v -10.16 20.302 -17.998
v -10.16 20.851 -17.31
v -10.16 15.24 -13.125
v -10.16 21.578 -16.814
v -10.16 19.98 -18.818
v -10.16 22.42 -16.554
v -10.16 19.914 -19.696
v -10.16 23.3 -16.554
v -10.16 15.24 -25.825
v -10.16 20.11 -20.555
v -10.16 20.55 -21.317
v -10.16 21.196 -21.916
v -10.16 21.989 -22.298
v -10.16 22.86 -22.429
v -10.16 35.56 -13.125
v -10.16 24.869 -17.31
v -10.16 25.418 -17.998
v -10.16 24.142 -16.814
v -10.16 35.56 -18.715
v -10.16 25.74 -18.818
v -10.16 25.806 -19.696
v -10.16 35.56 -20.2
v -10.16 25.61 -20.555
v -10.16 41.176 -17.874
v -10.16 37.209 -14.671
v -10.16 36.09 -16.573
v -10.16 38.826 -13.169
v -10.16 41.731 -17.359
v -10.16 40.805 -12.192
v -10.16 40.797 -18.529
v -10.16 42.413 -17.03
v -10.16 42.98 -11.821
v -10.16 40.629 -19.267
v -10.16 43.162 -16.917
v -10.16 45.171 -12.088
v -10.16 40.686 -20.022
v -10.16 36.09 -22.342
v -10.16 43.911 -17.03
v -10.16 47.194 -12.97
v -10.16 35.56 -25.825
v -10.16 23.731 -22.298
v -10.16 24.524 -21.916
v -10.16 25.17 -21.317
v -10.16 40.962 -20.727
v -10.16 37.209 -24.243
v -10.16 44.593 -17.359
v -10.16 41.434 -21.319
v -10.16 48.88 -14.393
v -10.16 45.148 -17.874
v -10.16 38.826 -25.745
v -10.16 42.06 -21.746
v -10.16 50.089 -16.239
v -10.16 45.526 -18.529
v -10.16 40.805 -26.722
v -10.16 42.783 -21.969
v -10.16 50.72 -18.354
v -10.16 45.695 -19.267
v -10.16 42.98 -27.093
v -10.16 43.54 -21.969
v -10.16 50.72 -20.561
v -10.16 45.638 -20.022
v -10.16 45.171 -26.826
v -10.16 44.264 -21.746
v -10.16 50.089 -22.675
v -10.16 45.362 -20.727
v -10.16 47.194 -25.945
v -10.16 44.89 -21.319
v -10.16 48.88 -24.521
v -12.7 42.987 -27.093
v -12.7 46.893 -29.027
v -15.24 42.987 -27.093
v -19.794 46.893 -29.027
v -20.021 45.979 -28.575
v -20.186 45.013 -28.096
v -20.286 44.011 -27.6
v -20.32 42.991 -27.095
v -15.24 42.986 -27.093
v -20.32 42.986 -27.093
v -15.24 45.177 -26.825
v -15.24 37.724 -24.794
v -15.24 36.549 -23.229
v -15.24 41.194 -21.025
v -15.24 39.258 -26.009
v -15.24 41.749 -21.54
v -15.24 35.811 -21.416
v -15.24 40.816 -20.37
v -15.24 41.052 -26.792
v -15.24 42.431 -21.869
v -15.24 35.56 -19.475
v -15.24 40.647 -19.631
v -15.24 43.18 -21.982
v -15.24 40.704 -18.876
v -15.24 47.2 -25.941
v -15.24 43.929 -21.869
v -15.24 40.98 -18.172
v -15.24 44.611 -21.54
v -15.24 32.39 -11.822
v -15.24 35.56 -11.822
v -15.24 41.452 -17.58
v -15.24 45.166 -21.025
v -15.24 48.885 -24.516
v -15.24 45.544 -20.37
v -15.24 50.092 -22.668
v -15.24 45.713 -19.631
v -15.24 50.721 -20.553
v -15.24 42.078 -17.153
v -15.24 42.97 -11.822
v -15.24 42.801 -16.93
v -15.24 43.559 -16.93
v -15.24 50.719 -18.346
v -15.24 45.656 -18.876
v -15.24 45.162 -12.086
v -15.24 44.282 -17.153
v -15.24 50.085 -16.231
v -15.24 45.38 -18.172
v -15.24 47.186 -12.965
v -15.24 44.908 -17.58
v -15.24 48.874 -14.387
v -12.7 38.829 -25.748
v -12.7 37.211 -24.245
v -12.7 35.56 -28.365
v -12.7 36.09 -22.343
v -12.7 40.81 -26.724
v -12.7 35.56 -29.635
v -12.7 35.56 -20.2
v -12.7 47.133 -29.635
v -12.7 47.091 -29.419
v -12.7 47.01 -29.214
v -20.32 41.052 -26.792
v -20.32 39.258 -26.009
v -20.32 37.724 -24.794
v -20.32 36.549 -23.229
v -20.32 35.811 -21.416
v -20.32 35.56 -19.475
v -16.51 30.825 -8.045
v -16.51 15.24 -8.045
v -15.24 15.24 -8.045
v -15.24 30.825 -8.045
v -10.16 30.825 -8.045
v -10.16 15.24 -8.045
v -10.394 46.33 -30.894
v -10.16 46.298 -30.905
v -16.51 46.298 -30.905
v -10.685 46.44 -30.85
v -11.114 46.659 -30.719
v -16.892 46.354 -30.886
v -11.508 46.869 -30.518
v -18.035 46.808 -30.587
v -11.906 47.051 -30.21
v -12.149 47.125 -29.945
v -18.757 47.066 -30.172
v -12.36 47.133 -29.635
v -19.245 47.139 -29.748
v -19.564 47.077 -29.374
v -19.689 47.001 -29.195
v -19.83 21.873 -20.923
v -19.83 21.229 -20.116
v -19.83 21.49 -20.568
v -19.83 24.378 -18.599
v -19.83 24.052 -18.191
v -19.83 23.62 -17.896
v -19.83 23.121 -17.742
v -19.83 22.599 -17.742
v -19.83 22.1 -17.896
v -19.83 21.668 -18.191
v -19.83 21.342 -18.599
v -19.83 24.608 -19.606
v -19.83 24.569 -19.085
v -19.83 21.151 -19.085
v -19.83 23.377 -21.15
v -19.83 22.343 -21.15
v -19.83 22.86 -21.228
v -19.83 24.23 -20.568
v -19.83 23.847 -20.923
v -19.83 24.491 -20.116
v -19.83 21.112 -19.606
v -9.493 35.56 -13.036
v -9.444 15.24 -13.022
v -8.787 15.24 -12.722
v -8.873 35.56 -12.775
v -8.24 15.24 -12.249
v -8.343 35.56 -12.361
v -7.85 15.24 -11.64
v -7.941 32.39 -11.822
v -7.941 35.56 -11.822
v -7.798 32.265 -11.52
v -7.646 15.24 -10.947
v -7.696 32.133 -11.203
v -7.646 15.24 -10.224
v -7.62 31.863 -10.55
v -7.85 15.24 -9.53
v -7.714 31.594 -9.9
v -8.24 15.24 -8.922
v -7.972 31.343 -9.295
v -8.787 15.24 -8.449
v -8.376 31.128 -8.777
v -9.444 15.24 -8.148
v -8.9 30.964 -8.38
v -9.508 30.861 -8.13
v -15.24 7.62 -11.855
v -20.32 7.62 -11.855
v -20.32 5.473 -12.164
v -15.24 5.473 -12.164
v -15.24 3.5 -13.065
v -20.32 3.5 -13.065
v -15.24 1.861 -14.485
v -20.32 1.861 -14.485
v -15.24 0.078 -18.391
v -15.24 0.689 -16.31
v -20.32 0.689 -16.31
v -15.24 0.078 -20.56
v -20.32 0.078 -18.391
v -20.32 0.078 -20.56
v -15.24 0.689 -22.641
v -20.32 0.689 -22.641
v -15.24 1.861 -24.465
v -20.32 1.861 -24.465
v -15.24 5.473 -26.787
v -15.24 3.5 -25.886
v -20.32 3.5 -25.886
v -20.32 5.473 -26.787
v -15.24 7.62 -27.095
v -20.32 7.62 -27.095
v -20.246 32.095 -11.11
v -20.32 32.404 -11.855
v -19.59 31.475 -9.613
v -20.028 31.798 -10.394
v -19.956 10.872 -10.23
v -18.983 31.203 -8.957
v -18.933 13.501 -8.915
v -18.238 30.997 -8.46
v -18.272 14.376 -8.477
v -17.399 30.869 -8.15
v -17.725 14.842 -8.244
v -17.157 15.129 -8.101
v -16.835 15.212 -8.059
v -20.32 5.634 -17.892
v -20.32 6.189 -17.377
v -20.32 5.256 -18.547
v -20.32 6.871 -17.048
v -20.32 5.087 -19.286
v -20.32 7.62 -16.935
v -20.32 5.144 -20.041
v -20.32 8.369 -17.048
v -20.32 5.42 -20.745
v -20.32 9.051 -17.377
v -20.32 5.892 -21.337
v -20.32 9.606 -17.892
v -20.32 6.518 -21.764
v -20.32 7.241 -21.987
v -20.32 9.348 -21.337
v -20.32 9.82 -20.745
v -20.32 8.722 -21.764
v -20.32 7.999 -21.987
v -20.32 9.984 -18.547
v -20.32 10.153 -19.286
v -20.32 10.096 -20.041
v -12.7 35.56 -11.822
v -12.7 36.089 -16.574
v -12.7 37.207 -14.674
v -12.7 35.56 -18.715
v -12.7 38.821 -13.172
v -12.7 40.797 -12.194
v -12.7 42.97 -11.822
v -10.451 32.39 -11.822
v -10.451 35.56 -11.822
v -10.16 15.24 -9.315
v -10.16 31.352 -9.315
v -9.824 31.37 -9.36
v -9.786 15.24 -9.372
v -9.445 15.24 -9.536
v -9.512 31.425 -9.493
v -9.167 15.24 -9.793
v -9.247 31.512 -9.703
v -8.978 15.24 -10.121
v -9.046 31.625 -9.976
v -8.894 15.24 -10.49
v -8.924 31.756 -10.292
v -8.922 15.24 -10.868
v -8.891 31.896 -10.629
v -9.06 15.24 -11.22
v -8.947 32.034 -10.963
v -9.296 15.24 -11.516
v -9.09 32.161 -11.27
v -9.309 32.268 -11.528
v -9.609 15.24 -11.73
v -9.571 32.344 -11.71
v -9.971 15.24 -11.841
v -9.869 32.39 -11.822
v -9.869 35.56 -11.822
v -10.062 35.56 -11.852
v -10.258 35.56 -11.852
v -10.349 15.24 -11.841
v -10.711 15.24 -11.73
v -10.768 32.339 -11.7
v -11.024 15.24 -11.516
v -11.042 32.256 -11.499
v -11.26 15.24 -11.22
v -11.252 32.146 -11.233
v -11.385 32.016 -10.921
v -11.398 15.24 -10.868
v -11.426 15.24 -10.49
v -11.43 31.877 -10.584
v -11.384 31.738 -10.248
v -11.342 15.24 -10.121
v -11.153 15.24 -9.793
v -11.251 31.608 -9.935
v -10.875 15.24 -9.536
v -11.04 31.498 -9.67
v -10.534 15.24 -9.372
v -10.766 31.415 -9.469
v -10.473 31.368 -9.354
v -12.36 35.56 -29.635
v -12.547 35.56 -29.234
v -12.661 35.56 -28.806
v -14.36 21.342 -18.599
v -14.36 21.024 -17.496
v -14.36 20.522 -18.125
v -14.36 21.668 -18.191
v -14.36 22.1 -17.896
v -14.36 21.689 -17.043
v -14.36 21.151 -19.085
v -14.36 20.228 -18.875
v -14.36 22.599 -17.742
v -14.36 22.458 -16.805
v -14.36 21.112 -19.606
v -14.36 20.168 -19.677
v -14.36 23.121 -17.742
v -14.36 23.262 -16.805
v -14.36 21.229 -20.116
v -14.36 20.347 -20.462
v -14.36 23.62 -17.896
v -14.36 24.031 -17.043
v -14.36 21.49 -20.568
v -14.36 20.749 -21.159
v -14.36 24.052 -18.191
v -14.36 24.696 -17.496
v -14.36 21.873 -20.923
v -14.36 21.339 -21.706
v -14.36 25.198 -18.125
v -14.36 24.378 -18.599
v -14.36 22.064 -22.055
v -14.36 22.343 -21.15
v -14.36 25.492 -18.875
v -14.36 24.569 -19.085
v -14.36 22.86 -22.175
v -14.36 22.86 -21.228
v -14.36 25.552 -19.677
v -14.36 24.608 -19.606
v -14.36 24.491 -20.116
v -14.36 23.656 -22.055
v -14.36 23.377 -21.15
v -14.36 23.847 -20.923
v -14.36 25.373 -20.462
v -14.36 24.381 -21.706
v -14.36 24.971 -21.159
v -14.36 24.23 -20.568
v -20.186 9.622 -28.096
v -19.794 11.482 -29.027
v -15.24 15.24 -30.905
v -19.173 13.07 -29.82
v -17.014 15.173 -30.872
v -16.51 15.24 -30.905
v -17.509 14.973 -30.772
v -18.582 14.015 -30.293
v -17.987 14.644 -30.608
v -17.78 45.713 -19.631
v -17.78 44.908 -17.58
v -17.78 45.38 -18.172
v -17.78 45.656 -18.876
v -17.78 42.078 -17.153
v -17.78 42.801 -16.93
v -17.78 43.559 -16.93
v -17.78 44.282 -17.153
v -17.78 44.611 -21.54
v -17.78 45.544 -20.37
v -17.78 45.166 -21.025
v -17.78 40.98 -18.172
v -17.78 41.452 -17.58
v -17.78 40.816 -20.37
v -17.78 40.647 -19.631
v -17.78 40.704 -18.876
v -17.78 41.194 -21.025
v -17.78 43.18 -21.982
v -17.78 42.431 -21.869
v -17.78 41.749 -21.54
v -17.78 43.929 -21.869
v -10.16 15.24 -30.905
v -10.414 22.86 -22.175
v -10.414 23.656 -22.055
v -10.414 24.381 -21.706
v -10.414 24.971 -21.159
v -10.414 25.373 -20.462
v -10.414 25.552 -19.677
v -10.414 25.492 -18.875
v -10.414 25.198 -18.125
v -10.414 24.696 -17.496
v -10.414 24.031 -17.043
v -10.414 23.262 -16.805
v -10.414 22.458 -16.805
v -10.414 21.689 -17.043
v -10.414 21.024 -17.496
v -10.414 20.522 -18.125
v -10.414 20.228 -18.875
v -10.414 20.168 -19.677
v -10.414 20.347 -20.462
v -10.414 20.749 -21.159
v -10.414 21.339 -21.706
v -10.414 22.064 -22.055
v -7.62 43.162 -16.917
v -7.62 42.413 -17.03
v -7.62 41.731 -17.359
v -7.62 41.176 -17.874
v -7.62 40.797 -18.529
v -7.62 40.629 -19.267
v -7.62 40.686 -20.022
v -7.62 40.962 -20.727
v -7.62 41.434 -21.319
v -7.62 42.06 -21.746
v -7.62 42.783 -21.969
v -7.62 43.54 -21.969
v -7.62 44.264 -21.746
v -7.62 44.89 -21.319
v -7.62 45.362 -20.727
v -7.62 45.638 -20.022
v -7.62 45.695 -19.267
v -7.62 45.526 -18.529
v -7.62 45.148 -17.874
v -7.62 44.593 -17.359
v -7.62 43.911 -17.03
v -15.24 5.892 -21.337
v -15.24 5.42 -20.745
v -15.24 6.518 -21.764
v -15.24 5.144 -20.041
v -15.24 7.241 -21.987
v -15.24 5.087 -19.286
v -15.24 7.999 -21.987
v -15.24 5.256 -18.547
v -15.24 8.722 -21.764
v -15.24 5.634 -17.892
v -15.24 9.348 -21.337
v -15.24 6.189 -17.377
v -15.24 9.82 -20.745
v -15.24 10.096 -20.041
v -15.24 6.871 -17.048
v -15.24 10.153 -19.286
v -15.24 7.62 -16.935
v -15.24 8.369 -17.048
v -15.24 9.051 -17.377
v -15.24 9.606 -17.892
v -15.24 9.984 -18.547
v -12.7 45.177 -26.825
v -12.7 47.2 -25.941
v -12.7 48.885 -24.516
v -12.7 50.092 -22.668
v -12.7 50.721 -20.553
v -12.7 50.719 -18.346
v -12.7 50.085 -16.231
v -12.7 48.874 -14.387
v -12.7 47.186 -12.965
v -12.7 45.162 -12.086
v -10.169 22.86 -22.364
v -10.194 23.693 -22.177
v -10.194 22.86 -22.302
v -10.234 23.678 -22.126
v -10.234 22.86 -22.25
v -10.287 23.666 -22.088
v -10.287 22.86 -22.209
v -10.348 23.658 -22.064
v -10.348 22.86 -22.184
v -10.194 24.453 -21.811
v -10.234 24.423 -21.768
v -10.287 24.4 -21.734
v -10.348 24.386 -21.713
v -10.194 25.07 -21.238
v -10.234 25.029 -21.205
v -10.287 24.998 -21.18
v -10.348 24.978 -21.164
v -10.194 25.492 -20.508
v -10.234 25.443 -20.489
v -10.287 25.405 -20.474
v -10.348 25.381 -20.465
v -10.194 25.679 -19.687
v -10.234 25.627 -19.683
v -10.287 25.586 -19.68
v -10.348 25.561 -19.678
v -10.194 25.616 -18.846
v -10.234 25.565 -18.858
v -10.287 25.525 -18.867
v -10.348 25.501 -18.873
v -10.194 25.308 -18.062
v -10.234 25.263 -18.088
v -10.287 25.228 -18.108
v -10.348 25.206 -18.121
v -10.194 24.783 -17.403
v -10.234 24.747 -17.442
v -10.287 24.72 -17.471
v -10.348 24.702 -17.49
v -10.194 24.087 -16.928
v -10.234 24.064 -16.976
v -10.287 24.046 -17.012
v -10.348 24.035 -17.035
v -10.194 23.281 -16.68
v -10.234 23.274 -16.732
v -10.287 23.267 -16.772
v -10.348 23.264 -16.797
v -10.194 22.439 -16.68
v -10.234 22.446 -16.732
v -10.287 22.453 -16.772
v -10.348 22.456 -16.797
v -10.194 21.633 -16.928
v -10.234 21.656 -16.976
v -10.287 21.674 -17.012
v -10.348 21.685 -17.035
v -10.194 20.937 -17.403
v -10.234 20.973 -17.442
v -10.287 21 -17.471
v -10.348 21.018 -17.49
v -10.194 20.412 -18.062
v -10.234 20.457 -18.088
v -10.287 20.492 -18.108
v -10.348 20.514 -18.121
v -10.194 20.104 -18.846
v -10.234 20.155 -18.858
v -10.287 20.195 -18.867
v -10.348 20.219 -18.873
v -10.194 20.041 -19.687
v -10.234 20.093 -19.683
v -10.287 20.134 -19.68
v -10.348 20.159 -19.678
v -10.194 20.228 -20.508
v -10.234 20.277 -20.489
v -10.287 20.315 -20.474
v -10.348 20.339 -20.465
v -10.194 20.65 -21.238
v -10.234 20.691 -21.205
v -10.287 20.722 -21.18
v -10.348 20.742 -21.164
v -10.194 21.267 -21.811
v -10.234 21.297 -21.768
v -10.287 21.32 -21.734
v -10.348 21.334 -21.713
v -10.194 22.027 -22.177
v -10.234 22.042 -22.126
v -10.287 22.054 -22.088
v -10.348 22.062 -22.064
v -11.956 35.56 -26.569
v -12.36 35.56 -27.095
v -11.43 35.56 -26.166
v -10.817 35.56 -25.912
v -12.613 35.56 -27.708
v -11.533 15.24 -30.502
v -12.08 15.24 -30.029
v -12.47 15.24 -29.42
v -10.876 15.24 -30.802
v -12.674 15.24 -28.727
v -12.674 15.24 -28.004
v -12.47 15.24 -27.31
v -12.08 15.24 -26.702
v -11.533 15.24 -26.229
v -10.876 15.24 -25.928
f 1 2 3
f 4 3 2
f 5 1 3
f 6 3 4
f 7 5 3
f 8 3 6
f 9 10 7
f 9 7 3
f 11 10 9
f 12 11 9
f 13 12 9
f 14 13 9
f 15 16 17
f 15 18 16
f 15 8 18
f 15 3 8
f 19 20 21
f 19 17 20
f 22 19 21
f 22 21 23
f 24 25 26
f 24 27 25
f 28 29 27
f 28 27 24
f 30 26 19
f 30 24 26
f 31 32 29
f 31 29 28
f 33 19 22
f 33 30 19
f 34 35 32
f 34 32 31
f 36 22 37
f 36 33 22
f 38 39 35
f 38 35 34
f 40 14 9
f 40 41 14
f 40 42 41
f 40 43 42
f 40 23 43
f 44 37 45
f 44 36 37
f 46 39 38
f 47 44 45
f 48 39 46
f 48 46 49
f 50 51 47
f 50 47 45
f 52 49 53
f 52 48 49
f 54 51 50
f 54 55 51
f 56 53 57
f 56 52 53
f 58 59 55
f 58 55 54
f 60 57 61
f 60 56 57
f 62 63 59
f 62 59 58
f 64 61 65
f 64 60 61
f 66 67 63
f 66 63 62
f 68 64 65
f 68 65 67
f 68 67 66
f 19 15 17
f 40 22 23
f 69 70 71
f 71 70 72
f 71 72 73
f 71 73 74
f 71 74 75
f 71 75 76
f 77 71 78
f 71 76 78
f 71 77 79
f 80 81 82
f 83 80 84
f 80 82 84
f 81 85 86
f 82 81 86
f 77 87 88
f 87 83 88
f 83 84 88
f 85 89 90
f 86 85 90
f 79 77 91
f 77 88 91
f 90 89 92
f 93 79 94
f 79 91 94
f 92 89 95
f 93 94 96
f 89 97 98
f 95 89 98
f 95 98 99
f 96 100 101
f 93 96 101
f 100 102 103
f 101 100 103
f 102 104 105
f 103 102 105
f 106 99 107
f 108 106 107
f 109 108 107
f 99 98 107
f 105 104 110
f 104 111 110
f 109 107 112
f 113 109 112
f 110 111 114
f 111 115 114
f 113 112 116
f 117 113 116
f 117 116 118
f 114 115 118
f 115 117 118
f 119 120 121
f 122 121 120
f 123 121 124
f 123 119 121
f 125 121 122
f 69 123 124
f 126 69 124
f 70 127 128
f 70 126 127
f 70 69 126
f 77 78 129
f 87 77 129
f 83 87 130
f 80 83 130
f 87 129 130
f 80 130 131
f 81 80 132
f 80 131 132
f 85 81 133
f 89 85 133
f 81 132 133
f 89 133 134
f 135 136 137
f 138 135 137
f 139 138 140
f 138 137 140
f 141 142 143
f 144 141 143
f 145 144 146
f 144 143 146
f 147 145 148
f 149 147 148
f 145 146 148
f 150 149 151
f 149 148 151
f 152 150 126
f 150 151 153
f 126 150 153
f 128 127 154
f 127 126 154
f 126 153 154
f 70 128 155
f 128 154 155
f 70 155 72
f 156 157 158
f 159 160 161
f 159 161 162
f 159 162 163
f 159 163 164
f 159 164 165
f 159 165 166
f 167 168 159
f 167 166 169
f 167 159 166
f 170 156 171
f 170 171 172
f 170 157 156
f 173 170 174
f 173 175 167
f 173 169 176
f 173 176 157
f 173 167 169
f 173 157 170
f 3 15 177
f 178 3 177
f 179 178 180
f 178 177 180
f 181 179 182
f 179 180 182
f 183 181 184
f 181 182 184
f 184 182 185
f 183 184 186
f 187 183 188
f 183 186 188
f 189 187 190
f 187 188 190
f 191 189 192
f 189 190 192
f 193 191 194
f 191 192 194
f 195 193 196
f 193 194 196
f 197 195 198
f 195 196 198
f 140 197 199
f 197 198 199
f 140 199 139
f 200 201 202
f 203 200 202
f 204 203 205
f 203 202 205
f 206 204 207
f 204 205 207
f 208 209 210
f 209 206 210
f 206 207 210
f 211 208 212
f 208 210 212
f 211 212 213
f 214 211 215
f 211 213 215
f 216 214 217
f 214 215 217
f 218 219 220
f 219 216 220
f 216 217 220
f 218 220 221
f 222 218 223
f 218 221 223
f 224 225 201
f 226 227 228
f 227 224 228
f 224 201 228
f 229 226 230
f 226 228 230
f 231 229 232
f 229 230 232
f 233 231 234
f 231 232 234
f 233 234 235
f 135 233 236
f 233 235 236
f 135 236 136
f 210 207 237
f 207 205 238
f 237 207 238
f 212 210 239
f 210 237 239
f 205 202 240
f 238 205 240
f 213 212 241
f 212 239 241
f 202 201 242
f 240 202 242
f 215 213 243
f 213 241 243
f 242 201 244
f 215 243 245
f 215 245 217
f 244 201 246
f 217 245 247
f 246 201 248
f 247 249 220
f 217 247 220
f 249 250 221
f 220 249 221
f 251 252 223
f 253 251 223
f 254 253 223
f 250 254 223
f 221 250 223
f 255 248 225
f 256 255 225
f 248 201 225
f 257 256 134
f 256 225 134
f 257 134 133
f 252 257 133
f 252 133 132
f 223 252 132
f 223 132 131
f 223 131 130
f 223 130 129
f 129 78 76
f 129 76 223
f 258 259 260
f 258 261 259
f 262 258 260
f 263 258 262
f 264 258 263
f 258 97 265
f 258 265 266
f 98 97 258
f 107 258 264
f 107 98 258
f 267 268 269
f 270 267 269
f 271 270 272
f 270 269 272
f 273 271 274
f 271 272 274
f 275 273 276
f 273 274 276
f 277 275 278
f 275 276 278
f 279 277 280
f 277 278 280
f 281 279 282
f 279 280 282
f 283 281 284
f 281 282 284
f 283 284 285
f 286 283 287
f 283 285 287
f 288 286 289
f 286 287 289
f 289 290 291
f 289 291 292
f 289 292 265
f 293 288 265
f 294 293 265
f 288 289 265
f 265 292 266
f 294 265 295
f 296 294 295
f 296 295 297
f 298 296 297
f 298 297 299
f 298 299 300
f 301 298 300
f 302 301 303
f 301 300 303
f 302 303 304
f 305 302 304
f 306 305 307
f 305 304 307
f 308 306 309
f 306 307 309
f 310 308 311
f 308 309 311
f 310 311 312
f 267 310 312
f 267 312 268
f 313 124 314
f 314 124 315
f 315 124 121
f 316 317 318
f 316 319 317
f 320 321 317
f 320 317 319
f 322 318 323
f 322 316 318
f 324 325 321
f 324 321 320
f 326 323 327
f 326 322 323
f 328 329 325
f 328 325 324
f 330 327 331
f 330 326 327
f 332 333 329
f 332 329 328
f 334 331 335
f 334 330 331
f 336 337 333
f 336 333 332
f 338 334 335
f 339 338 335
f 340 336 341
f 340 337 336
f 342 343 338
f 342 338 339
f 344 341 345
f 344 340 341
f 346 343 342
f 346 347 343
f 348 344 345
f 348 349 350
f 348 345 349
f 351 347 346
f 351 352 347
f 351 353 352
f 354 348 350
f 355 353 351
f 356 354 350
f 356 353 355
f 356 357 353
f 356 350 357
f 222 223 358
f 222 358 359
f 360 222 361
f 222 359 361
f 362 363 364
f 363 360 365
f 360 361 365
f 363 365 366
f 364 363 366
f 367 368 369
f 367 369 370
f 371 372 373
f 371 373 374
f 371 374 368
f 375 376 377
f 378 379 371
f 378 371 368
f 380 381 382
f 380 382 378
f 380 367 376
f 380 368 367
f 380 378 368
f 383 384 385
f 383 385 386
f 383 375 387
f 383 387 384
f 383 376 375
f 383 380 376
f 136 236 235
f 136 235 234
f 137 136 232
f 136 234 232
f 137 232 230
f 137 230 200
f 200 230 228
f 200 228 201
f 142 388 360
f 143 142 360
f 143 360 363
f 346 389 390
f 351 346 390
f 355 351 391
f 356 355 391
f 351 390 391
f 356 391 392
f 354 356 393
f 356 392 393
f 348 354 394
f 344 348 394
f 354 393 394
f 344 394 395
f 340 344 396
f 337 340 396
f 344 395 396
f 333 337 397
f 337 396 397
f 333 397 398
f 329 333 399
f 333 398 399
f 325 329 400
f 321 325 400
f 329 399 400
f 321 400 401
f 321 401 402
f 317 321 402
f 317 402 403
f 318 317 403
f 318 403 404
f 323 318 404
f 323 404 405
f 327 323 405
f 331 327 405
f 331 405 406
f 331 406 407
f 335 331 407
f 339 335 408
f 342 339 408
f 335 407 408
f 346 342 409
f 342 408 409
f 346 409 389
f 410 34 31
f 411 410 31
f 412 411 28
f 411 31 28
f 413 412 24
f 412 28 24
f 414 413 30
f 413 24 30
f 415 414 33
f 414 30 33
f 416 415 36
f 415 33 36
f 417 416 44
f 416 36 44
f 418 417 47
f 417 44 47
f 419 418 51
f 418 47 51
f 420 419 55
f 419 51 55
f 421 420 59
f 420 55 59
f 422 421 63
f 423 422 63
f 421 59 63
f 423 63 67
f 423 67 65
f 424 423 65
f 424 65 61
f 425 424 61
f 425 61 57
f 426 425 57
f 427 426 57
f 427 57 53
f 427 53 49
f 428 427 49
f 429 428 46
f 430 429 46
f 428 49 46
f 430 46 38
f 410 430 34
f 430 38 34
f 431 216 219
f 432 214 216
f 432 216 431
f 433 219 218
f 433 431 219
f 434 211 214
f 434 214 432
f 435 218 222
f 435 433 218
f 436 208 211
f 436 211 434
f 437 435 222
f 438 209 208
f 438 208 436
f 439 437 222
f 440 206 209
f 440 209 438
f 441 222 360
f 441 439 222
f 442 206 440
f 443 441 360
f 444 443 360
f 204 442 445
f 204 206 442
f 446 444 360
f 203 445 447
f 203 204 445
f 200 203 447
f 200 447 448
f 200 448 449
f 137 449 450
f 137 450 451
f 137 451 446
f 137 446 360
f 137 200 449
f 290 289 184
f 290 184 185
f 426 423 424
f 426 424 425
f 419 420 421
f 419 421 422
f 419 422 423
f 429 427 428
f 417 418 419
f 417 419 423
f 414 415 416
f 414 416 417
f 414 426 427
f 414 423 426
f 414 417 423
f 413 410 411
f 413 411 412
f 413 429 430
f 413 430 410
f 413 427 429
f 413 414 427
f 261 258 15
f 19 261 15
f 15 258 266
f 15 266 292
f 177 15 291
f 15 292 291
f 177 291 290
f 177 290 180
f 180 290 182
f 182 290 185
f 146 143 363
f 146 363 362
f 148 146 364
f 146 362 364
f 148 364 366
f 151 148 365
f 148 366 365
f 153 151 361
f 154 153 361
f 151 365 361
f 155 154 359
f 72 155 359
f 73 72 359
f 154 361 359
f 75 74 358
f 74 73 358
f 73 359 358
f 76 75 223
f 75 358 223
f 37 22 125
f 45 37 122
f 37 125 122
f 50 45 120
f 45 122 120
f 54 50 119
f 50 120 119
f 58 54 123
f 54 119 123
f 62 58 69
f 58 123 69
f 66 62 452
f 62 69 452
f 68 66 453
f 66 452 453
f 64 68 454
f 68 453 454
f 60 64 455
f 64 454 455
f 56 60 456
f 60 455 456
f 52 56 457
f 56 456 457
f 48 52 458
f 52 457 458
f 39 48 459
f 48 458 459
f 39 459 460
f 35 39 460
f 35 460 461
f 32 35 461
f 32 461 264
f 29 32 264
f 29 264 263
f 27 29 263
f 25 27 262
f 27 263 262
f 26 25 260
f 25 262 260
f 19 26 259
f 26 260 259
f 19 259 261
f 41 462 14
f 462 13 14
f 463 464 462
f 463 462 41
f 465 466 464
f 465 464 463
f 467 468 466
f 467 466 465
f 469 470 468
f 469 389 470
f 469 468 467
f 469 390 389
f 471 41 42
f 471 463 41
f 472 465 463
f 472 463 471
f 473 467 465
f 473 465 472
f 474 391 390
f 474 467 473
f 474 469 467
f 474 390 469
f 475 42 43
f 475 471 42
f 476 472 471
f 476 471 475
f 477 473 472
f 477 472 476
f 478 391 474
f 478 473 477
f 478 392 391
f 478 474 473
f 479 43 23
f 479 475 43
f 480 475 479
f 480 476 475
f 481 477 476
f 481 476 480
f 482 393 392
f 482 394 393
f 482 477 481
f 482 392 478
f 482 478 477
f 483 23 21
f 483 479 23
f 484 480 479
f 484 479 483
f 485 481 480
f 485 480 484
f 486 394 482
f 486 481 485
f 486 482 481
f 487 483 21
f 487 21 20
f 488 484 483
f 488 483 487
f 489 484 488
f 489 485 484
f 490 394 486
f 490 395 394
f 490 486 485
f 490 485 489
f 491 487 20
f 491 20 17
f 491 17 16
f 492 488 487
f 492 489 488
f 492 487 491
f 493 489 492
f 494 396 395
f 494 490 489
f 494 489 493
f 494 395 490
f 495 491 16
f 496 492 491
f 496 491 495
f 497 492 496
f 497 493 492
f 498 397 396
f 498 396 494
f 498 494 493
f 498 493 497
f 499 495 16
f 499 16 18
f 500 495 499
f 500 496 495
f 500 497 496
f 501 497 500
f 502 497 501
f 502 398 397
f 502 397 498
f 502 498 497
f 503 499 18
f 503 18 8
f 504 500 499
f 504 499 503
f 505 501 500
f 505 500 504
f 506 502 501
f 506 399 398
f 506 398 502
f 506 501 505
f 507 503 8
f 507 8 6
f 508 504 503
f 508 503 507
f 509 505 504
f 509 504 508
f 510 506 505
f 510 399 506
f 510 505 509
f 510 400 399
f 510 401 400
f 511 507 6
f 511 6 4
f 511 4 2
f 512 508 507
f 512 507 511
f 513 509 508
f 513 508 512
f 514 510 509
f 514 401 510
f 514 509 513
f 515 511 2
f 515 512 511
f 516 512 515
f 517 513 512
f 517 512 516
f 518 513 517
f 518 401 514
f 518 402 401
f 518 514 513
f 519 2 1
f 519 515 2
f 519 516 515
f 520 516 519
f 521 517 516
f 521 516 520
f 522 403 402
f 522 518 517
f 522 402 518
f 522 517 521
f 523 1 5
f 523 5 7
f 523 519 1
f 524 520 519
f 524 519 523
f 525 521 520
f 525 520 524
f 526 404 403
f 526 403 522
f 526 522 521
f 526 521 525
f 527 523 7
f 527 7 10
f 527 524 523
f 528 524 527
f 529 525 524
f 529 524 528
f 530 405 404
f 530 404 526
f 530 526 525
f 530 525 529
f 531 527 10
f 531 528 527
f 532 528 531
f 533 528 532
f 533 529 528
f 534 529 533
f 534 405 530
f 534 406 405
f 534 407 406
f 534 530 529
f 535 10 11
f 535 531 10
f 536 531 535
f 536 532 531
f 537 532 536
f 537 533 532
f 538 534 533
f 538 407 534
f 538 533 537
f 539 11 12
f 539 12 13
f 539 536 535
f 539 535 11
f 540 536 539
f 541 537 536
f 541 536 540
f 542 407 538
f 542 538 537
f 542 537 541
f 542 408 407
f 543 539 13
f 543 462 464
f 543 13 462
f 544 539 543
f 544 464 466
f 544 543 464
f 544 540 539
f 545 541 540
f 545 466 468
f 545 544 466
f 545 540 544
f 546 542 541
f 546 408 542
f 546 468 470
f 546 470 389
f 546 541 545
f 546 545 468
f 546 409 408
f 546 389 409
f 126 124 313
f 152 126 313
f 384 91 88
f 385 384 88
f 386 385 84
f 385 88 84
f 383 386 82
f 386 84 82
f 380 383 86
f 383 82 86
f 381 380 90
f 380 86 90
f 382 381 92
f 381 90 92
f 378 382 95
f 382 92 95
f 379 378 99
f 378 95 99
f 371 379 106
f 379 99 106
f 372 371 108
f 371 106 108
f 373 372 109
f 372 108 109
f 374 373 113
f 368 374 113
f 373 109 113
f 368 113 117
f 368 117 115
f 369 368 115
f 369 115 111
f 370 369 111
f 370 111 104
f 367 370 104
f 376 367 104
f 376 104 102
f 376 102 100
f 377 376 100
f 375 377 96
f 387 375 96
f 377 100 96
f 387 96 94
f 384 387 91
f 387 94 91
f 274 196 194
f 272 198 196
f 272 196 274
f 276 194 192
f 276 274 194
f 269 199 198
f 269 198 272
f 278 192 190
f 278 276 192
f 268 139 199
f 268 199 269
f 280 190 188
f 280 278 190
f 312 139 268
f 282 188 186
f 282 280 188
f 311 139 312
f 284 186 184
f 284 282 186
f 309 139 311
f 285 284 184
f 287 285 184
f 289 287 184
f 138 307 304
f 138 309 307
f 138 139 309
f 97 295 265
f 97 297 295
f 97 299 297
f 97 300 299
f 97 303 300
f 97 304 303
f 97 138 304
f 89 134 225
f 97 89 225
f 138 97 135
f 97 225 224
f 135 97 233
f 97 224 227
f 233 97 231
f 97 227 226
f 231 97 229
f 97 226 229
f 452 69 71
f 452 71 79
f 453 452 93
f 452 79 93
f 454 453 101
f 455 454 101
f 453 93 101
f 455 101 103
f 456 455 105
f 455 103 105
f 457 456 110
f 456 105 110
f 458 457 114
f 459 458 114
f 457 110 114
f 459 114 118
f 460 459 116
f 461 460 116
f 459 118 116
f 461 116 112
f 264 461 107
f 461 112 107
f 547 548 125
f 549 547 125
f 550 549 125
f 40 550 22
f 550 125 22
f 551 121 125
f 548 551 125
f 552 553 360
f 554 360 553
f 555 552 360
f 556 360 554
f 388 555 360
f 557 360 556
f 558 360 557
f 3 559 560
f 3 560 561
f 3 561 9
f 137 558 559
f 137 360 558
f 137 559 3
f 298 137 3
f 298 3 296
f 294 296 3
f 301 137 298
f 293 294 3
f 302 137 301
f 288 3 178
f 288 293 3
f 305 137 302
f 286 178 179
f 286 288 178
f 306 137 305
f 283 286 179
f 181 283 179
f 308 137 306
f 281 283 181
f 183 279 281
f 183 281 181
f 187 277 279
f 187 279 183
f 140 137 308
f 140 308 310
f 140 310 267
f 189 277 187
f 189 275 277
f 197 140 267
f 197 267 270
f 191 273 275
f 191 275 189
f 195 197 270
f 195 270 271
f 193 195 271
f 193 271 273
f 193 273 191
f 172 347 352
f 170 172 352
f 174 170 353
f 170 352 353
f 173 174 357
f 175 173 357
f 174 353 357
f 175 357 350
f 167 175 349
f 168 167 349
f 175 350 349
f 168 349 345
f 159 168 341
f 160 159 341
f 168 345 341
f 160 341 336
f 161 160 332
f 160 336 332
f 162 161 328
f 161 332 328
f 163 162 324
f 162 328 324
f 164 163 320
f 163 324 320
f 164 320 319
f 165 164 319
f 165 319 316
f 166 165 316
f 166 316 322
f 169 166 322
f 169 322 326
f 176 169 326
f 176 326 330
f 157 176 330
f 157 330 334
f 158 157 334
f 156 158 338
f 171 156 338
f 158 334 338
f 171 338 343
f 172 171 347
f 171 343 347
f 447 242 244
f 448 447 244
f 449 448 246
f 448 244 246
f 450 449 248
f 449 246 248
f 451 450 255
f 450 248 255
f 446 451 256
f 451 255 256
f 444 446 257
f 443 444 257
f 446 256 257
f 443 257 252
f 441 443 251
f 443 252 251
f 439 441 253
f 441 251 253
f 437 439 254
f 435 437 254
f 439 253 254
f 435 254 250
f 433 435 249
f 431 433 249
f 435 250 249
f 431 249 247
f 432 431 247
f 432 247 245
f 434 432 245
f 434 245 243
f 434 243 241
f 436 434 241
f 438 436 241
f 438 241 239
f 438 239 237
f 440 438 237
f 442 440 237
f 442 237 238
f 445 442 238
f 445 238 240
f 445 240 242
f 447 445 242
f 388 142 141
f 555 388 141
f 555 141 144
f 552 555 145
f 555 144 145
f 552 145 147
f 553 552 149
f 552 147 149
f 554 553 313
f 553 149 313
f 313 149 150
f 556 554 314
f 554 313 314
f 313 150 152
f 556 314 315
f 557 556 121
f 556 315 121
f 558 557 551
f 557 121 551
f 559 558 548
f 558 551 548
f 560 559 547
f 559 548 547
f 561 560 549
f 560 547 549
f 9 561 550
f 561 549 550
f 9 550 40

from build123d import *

# Parameters (mm, degrees)
BOSS_EXTRUDE1_DEPTH = 50.8
SKETCH3_R           = 1.27
CUT_EXTRUDE2_DEPTH  = 50.8
CUT_EXTRUDE1_DEPTH  = 50.8
CUT_EXTRUDE6_DEPTH  = 50.8
BOSS_EXTRUDE3_DEPTH = 20.32
SKETCH4_W           = 10.16
SKETCH4_H           = 15.24
CUT_EXTRUDE3_DEPTH  = 50.8
SKETCH5_R           = 2.54
CUT_EXTRUDE5_DEPTH  = 50.8
SKETCH8_R           = 2.54
BOSS_EXTRUDE2_DEPTH = 2.54
LPATTERN1_COUNT     = 2
LPATTERN1_PITCH     = 12.7
CUT_EXTRUDE7_DEPTH  = 20.32
SKETCH12_W          = 5.08
SKETCH12_H          = 19.941398178
CUT_EXTRUDE8_DEPTH  = 21.59
CUT_EXTRUDE9_DEPTH  = 5.08
LPATTERN2_COUNT     = 2
LPATTERN2_PITCH     = 15.24
CUT_EXTRUDE10_DEPTH = 40.767
SKETCH14_R          = 7.638081415
BOSS_EXTRUDE4_DEPTH = 2.54
SKETCH16_R          = 2.54
BOSS_EXTRUDE5_DEPTH = 2.54
SKETCH21_W          = 3.776239755
SKETCH21_H          = 7.410355269
CUT_EXTRUDE14_DEPTH = 2.54
CUT_EXTRUDE15_DEPTH = 9.906
SKETCH23_R          = 2.7
CUT_EXTRUDE16_DEPTH = 4.2
FILLET1_R           = 0.254
SKETCH24_R          = 1.7526
CUT_EXTRUDE17_DEPTH = 5.47


with BuildPart() as part:
    # Sketch1 → Boss-Extrude1 (new body)
    with BuildSketch(Plane(origin=(0, 0, 0), x_dir=(1, 0, 0), z_dir=(0, 1, 0))):
        with BuildLine():
            Line((-20.32, 27.095319289), (-20.32, 11.855319289))
            ThreePointArc((-20.32, 11.855319289), (-19.204076836, 9.161242453), (-16.51, 8.045319289))
            Line((-16.51, 8.045319289), (-3.81, 8.045319289))
            ThreePointArc((-3.81, 8.045319289), (-1.115923164, 9.161242453), (0, 11.855319289))
            Line((0, 11.855319289), (0, 27.095319289))
            ThreePointArc((0, 27.095319289), (-1.115923164, 29.789396126), (-3.81, 30.905319289))
            Line((-3.81, 30.905319289), (-16.51, 30.905319289))
            ThreePointArc((-16.51, 30.905319289), (-19.204076836, 29.789396126), (-20.32, 27.095319289))
        make_face()
    extrude(amount=BOSS_EXTRUDE1_DEPTH)

    # Sketch3 → Cut-Extrude2 (cut)
    with BuildSketch(Plane(origin=(0, 50.8, 0), x_dir=(1, 0, 0), z_dir=(0, 1, 0))):
        with Locations(Location((-10.16, 10.585319289, 0), (0, 0, 270))):
            Circle(SKETCH3_R)
        with Locations(Location((-10.16, 28.365319289, 0), (0, 0, 270))):
            Circle(SKETCH3_R)
    extrude(amount=-CUT_EXTRUDE2_DEPTH, mode=Mode.SUBTRACT)

    # Sketch2 → Cut-Extrude1 (cut)
    with BuildSketch(Plane.ZY.offset(20.32)):
        with BuildLine():
            Line((-27.095319289, 7.62), (-30.905319289, 15.24))
            Line((-30.905319289, 15.24), (-30.905319289, -5.08))
            Line((-30.905319289, -5.08), (-8.045319289, -5.08))
            Line((-8.045319289, -5.08), (-8.045319289, 15.24))
            Line((-8.045319289, 15.24), (-11.855319289, 7.62))
            ThreePointArc((-11.855319289, 7.62), (-19.475319289, 0), (-27.095319289, 7.62))
        make_face()
        with BuildLine():
            Line((-11.821559044, 42.970355269), (-8.045319289, 35.56))
            Line((-8.045319289, 35.56), (-8.045319289, 55.88))
            Line((-8.045319289, 55.88), (-30.905319289, 55.88))
            Line((-30.905319289, 55.88), (-30.905319289, 35.56))
            Line((-30.905319289, 35.56), (-27.092422036, 42.951560486))
            ThreePointArc((-27.092422036, 42.951560486), (-19.46663852, 50.799994215), (-11.821559044, 42.970355269))
        make_face()
    extrude(amount=-CUT_EXTRUDE1_DEPTH, mode=Mode.SUBTRACT)

    # Sketch7 → Cut-Extrude6 (cut)
    with BuildSketch(Plane.XY.offset(-8.045319289)):
        Polygon((-15.24, 50.8), (-12.7, 50.8), (-12.7, 35.56), (-7.62, 35.56), (-7.62, 50.8), (-5.08, 50.8), (-5.08, 35.56), (0, 35.56), (0, 59.156438057), (-20.32, 59.156438057), (-20.32, 35.56), (-15.24, 35.56), align=None)
    extrude(amount=-CUT_EXTRUDE6_DEPTH, mode=Mode.SUBTRACT)

    # Sketch9 → Boss-Extrude3 (add)
    with BuildSketch(Plane.ZY.offset(20.32)):
        with BuildLine():
            Line((-19.475319289, 35.56), (-30.961107471, 35.56))
            Line((-30.961107471, 35.56), (-30.961107471, 45.935432902))
            ThreePointArc((-30.961107471, 45.935432902), (-30.291229548, 47.014503778), (-29.026975399, 46.892882091))
            Line((-29.026975399, 46.892882091), (-27.092843326, 42.985764183))
            ThreePointArc((-27.092843326, 42.985764183), (-24.794356941, 37.723605727), (-19.475319289, 35.56))
        make_face()
    extrude(amount=-BOSS_EXTRUDE3_DEPTH)

    # Sketch4 → Cut-Extrude3 (cut)
    with BuildSketch(Plane.XY.offset(-8.045319289)):
        with Locations((-10.16, 7.62)):
            Rectangle(SKETCH4_W, SKETCH4_H)
    extrude(amount=-CUT_EXTRUDE3_DEPTH, mode=Mode.SUBTRACT)

    # Sketch5 → Cut-Extrude5 (cut)
    with BuildSketch(Plane.ZY.offset(20.32)):
        with Locations((-19.475319289, 7.62)):
            Circle(SKETCH5_R)
    extrude(amount=-CUT_EXTRUDE5_DEPTH, mode=Mode.SUBTRACT)

    # Sketch8 → Boss-Extrude2 (add)
    with BuildSketch(Plane.ZY.offset(15.24)):
        with Locations(Location((-19.441559044, 43.179995622, 0), (0, 0, 180))):
            Circle(SKETCH8_R)
    boss_extrude2 = extrude(amount=BOSS_EXTRUDE2_DEPTH)

    # LPattern1: Boss-Extrude2 ×2
    with Locations(*[(i * LPATTERN1_PITCH, 0, 0) for i in range(1, LPATTERN1_COUNT)]):
        add(boss_extrude2)

    # Sketch10 → Cut-Extrude7 (cut)
    with BuildSketch(Plane.XZ.offset(-35.56)):
        with BuildLine():
            Line((-16.51, -30.905319289), (-3.81, -30.905319289))
            ThreePointArc((-3.81, -30.905319289), (-1.115923164, -29.789396126), (0, -27.095319289))
            Line((0, -27.095319289), (5.770912039, -37.258829719))
            Line((5.770912039, -37.258829719), (-26.797758959, -37.890739908))
            Line((-26.797758959, -37.890739908), (-20.32, -27.095319289))
            ThreePointArc((-20.32, -27.095319289), (-19.204076836, -29.789396126), (-16.51, -30.905319289))
        make_face()
    extrude(amount=-CUT_EXTRUDE7_DEPTH, mode=Mode.SUBTRACT)

    # Sketch12 → Cut-Extrude8 (cut)
    with BuildSketch(Plane.XY.offset(-8.045319289)):
        with Locations((-10.16, 45.530699089)):
            Rectangle(SKETCH12_W, SKETCH12_H)
    extrude(amount=-CUT_EXTRUDE8_DEPTH, mode=Mode.SUBTRACT)

    # Sketch13 → Cut-Extrude9 (cut)
    with BuildSketch(Plane.ZY.offset(20.32)):
        Polygon((-19.475319289, 35.56), (-8.045319289, 30.82545932), (-1.320705488, 30.82545932), (-1.320705488, 35.56), align=None)
    cut_extrude9 = extrude(amount=-CUT_EXTRUDE9_DEPTH, mode=Mode.SUBTRACT)

    # LPattern2: Cut-Extrude9 ×2
    with Locations(*[(i * LPATTERN2_PITCH, 0, 0) for i in range(1, LPATTERN2_COUNT)]):
        add(cut_extrude9, mode=Mode.SUBTRACT)

    # Sketch15 → Cut-Extrude10 (cut, symmetric)
    with BuildSketch(Plane(origin=(0, 35.56, 0), x_dir=(1, 0, 0), z_dir=(0, 1, 0))):
        with BuildLine():
            Line((-10.16, 25.825319289), (-10.16, 13.125319289))
            ThreePointArc((-10.16, 13.125319289), (-7.62, 10.585319289), (-10.16, 8.045319289))
            Line((-10.16, 8.045319289), (12.124662948, -15.989120413))
            Line((12.124662948, -15.989120413), (8.97204404, 40.385502166))
            Line((8.97204404, 40.385502166), (-10.16, 30.905319289))
            ThreePointArc((-10.16, 30.905319289), (-12.7, 28.365319289), (-10.16, 25.825319289))
        make_face()
    extrude(amount=CUT_EXTRUDE10_DEPTH, both=True, mode=Mode.SUBTRACT)

    # Sketch14 → Boss-Extrude4 (add)
    with BuildSketch(Plane(origin=(-12.7, 0, 0), x_dir=(0, 0, -1), z_dir=(1, 0, 0))):
        with Locations((19.457237874, 43.161918585)):
            Circle(SKETCH14_R)
    extrude(amount=BOSS_EXTRUDE4_DEPTH)

    # Sketch16 → Boss-Extrude5 (add)
    with BuildSketch(Plane(origin=(-10.16, 0, 0), x_dir=(0, 0, -1), z_dir=(1, 0, 0))):
        with Locations(Location((19.457237874, 43.161918585, 0), (0, 0, 180))):
            Circle(SKETCH16_R)
    extrude(amount=BOSS_EXTRUDE5_DEPTH)

    # Sketch21 → Cut-Extrude14 (cut)
    with BuildSketch(Plane.ZY.offset(15.24)):
        with Locations((-9.933439167, 39.265177635)):
            Rectangle(SKETCH21_W, SKETCH21_H)
    extrude(amount=-CUT_EXTRUDE14_DEPTH, mode=Mode.SUBTRACT)

    # Sketch22 → Cut-Extrude15 (cut)
    with BuildSketch(Plane.ZY.offset(15.24)):
        Polygon((-8.045319289, 30.82545932), (-11.821559044, 32.38965536), (-11.821559044, 35.56), (-8.045319289, 35.56), align=None)
    extrude(amount=-CUT_EXTRUDE15_DEPTH, mode=Mode.SUBTRACT)

    # Sketch23 → Cut-Extrude16 (cut)
    with BuildSketch(Plane(origin=(-10.16, 0, 0), x_dir=(0, 0, -1), z_dir=(1, 0, 0))):
        with Locations((19.475319289, 22.86)):
            Circle(SKETCH23_R)
    extrude(amount=-CUT_EXTRUDE16_DEPTH, mode=Mode.SUBTRACT)

    # Fillet1
    fillet1_edges = [part.edges().sort_by_distance(p)[0] for p in [
        (-10.16, 22.86, -16.775319289),
    ]]
    fillet(fillet1_edges, radius=FILLET1_R)

    # Sketch24 → Cut-Extrude17 (cut)
    with BuildSketch(Plane(origin=(-14.36, 0, 0), x_dir=(0, 0, -1), z_dir=(1, 0, 0))):
        with Locations((19.475319289, 22.86)):
            Circle(SKETCH24_R)
    extrude(amount=-CUT_EXTRUDE17_DEPTH, mode=Mode.SUBTRACT)


solid = part.part
